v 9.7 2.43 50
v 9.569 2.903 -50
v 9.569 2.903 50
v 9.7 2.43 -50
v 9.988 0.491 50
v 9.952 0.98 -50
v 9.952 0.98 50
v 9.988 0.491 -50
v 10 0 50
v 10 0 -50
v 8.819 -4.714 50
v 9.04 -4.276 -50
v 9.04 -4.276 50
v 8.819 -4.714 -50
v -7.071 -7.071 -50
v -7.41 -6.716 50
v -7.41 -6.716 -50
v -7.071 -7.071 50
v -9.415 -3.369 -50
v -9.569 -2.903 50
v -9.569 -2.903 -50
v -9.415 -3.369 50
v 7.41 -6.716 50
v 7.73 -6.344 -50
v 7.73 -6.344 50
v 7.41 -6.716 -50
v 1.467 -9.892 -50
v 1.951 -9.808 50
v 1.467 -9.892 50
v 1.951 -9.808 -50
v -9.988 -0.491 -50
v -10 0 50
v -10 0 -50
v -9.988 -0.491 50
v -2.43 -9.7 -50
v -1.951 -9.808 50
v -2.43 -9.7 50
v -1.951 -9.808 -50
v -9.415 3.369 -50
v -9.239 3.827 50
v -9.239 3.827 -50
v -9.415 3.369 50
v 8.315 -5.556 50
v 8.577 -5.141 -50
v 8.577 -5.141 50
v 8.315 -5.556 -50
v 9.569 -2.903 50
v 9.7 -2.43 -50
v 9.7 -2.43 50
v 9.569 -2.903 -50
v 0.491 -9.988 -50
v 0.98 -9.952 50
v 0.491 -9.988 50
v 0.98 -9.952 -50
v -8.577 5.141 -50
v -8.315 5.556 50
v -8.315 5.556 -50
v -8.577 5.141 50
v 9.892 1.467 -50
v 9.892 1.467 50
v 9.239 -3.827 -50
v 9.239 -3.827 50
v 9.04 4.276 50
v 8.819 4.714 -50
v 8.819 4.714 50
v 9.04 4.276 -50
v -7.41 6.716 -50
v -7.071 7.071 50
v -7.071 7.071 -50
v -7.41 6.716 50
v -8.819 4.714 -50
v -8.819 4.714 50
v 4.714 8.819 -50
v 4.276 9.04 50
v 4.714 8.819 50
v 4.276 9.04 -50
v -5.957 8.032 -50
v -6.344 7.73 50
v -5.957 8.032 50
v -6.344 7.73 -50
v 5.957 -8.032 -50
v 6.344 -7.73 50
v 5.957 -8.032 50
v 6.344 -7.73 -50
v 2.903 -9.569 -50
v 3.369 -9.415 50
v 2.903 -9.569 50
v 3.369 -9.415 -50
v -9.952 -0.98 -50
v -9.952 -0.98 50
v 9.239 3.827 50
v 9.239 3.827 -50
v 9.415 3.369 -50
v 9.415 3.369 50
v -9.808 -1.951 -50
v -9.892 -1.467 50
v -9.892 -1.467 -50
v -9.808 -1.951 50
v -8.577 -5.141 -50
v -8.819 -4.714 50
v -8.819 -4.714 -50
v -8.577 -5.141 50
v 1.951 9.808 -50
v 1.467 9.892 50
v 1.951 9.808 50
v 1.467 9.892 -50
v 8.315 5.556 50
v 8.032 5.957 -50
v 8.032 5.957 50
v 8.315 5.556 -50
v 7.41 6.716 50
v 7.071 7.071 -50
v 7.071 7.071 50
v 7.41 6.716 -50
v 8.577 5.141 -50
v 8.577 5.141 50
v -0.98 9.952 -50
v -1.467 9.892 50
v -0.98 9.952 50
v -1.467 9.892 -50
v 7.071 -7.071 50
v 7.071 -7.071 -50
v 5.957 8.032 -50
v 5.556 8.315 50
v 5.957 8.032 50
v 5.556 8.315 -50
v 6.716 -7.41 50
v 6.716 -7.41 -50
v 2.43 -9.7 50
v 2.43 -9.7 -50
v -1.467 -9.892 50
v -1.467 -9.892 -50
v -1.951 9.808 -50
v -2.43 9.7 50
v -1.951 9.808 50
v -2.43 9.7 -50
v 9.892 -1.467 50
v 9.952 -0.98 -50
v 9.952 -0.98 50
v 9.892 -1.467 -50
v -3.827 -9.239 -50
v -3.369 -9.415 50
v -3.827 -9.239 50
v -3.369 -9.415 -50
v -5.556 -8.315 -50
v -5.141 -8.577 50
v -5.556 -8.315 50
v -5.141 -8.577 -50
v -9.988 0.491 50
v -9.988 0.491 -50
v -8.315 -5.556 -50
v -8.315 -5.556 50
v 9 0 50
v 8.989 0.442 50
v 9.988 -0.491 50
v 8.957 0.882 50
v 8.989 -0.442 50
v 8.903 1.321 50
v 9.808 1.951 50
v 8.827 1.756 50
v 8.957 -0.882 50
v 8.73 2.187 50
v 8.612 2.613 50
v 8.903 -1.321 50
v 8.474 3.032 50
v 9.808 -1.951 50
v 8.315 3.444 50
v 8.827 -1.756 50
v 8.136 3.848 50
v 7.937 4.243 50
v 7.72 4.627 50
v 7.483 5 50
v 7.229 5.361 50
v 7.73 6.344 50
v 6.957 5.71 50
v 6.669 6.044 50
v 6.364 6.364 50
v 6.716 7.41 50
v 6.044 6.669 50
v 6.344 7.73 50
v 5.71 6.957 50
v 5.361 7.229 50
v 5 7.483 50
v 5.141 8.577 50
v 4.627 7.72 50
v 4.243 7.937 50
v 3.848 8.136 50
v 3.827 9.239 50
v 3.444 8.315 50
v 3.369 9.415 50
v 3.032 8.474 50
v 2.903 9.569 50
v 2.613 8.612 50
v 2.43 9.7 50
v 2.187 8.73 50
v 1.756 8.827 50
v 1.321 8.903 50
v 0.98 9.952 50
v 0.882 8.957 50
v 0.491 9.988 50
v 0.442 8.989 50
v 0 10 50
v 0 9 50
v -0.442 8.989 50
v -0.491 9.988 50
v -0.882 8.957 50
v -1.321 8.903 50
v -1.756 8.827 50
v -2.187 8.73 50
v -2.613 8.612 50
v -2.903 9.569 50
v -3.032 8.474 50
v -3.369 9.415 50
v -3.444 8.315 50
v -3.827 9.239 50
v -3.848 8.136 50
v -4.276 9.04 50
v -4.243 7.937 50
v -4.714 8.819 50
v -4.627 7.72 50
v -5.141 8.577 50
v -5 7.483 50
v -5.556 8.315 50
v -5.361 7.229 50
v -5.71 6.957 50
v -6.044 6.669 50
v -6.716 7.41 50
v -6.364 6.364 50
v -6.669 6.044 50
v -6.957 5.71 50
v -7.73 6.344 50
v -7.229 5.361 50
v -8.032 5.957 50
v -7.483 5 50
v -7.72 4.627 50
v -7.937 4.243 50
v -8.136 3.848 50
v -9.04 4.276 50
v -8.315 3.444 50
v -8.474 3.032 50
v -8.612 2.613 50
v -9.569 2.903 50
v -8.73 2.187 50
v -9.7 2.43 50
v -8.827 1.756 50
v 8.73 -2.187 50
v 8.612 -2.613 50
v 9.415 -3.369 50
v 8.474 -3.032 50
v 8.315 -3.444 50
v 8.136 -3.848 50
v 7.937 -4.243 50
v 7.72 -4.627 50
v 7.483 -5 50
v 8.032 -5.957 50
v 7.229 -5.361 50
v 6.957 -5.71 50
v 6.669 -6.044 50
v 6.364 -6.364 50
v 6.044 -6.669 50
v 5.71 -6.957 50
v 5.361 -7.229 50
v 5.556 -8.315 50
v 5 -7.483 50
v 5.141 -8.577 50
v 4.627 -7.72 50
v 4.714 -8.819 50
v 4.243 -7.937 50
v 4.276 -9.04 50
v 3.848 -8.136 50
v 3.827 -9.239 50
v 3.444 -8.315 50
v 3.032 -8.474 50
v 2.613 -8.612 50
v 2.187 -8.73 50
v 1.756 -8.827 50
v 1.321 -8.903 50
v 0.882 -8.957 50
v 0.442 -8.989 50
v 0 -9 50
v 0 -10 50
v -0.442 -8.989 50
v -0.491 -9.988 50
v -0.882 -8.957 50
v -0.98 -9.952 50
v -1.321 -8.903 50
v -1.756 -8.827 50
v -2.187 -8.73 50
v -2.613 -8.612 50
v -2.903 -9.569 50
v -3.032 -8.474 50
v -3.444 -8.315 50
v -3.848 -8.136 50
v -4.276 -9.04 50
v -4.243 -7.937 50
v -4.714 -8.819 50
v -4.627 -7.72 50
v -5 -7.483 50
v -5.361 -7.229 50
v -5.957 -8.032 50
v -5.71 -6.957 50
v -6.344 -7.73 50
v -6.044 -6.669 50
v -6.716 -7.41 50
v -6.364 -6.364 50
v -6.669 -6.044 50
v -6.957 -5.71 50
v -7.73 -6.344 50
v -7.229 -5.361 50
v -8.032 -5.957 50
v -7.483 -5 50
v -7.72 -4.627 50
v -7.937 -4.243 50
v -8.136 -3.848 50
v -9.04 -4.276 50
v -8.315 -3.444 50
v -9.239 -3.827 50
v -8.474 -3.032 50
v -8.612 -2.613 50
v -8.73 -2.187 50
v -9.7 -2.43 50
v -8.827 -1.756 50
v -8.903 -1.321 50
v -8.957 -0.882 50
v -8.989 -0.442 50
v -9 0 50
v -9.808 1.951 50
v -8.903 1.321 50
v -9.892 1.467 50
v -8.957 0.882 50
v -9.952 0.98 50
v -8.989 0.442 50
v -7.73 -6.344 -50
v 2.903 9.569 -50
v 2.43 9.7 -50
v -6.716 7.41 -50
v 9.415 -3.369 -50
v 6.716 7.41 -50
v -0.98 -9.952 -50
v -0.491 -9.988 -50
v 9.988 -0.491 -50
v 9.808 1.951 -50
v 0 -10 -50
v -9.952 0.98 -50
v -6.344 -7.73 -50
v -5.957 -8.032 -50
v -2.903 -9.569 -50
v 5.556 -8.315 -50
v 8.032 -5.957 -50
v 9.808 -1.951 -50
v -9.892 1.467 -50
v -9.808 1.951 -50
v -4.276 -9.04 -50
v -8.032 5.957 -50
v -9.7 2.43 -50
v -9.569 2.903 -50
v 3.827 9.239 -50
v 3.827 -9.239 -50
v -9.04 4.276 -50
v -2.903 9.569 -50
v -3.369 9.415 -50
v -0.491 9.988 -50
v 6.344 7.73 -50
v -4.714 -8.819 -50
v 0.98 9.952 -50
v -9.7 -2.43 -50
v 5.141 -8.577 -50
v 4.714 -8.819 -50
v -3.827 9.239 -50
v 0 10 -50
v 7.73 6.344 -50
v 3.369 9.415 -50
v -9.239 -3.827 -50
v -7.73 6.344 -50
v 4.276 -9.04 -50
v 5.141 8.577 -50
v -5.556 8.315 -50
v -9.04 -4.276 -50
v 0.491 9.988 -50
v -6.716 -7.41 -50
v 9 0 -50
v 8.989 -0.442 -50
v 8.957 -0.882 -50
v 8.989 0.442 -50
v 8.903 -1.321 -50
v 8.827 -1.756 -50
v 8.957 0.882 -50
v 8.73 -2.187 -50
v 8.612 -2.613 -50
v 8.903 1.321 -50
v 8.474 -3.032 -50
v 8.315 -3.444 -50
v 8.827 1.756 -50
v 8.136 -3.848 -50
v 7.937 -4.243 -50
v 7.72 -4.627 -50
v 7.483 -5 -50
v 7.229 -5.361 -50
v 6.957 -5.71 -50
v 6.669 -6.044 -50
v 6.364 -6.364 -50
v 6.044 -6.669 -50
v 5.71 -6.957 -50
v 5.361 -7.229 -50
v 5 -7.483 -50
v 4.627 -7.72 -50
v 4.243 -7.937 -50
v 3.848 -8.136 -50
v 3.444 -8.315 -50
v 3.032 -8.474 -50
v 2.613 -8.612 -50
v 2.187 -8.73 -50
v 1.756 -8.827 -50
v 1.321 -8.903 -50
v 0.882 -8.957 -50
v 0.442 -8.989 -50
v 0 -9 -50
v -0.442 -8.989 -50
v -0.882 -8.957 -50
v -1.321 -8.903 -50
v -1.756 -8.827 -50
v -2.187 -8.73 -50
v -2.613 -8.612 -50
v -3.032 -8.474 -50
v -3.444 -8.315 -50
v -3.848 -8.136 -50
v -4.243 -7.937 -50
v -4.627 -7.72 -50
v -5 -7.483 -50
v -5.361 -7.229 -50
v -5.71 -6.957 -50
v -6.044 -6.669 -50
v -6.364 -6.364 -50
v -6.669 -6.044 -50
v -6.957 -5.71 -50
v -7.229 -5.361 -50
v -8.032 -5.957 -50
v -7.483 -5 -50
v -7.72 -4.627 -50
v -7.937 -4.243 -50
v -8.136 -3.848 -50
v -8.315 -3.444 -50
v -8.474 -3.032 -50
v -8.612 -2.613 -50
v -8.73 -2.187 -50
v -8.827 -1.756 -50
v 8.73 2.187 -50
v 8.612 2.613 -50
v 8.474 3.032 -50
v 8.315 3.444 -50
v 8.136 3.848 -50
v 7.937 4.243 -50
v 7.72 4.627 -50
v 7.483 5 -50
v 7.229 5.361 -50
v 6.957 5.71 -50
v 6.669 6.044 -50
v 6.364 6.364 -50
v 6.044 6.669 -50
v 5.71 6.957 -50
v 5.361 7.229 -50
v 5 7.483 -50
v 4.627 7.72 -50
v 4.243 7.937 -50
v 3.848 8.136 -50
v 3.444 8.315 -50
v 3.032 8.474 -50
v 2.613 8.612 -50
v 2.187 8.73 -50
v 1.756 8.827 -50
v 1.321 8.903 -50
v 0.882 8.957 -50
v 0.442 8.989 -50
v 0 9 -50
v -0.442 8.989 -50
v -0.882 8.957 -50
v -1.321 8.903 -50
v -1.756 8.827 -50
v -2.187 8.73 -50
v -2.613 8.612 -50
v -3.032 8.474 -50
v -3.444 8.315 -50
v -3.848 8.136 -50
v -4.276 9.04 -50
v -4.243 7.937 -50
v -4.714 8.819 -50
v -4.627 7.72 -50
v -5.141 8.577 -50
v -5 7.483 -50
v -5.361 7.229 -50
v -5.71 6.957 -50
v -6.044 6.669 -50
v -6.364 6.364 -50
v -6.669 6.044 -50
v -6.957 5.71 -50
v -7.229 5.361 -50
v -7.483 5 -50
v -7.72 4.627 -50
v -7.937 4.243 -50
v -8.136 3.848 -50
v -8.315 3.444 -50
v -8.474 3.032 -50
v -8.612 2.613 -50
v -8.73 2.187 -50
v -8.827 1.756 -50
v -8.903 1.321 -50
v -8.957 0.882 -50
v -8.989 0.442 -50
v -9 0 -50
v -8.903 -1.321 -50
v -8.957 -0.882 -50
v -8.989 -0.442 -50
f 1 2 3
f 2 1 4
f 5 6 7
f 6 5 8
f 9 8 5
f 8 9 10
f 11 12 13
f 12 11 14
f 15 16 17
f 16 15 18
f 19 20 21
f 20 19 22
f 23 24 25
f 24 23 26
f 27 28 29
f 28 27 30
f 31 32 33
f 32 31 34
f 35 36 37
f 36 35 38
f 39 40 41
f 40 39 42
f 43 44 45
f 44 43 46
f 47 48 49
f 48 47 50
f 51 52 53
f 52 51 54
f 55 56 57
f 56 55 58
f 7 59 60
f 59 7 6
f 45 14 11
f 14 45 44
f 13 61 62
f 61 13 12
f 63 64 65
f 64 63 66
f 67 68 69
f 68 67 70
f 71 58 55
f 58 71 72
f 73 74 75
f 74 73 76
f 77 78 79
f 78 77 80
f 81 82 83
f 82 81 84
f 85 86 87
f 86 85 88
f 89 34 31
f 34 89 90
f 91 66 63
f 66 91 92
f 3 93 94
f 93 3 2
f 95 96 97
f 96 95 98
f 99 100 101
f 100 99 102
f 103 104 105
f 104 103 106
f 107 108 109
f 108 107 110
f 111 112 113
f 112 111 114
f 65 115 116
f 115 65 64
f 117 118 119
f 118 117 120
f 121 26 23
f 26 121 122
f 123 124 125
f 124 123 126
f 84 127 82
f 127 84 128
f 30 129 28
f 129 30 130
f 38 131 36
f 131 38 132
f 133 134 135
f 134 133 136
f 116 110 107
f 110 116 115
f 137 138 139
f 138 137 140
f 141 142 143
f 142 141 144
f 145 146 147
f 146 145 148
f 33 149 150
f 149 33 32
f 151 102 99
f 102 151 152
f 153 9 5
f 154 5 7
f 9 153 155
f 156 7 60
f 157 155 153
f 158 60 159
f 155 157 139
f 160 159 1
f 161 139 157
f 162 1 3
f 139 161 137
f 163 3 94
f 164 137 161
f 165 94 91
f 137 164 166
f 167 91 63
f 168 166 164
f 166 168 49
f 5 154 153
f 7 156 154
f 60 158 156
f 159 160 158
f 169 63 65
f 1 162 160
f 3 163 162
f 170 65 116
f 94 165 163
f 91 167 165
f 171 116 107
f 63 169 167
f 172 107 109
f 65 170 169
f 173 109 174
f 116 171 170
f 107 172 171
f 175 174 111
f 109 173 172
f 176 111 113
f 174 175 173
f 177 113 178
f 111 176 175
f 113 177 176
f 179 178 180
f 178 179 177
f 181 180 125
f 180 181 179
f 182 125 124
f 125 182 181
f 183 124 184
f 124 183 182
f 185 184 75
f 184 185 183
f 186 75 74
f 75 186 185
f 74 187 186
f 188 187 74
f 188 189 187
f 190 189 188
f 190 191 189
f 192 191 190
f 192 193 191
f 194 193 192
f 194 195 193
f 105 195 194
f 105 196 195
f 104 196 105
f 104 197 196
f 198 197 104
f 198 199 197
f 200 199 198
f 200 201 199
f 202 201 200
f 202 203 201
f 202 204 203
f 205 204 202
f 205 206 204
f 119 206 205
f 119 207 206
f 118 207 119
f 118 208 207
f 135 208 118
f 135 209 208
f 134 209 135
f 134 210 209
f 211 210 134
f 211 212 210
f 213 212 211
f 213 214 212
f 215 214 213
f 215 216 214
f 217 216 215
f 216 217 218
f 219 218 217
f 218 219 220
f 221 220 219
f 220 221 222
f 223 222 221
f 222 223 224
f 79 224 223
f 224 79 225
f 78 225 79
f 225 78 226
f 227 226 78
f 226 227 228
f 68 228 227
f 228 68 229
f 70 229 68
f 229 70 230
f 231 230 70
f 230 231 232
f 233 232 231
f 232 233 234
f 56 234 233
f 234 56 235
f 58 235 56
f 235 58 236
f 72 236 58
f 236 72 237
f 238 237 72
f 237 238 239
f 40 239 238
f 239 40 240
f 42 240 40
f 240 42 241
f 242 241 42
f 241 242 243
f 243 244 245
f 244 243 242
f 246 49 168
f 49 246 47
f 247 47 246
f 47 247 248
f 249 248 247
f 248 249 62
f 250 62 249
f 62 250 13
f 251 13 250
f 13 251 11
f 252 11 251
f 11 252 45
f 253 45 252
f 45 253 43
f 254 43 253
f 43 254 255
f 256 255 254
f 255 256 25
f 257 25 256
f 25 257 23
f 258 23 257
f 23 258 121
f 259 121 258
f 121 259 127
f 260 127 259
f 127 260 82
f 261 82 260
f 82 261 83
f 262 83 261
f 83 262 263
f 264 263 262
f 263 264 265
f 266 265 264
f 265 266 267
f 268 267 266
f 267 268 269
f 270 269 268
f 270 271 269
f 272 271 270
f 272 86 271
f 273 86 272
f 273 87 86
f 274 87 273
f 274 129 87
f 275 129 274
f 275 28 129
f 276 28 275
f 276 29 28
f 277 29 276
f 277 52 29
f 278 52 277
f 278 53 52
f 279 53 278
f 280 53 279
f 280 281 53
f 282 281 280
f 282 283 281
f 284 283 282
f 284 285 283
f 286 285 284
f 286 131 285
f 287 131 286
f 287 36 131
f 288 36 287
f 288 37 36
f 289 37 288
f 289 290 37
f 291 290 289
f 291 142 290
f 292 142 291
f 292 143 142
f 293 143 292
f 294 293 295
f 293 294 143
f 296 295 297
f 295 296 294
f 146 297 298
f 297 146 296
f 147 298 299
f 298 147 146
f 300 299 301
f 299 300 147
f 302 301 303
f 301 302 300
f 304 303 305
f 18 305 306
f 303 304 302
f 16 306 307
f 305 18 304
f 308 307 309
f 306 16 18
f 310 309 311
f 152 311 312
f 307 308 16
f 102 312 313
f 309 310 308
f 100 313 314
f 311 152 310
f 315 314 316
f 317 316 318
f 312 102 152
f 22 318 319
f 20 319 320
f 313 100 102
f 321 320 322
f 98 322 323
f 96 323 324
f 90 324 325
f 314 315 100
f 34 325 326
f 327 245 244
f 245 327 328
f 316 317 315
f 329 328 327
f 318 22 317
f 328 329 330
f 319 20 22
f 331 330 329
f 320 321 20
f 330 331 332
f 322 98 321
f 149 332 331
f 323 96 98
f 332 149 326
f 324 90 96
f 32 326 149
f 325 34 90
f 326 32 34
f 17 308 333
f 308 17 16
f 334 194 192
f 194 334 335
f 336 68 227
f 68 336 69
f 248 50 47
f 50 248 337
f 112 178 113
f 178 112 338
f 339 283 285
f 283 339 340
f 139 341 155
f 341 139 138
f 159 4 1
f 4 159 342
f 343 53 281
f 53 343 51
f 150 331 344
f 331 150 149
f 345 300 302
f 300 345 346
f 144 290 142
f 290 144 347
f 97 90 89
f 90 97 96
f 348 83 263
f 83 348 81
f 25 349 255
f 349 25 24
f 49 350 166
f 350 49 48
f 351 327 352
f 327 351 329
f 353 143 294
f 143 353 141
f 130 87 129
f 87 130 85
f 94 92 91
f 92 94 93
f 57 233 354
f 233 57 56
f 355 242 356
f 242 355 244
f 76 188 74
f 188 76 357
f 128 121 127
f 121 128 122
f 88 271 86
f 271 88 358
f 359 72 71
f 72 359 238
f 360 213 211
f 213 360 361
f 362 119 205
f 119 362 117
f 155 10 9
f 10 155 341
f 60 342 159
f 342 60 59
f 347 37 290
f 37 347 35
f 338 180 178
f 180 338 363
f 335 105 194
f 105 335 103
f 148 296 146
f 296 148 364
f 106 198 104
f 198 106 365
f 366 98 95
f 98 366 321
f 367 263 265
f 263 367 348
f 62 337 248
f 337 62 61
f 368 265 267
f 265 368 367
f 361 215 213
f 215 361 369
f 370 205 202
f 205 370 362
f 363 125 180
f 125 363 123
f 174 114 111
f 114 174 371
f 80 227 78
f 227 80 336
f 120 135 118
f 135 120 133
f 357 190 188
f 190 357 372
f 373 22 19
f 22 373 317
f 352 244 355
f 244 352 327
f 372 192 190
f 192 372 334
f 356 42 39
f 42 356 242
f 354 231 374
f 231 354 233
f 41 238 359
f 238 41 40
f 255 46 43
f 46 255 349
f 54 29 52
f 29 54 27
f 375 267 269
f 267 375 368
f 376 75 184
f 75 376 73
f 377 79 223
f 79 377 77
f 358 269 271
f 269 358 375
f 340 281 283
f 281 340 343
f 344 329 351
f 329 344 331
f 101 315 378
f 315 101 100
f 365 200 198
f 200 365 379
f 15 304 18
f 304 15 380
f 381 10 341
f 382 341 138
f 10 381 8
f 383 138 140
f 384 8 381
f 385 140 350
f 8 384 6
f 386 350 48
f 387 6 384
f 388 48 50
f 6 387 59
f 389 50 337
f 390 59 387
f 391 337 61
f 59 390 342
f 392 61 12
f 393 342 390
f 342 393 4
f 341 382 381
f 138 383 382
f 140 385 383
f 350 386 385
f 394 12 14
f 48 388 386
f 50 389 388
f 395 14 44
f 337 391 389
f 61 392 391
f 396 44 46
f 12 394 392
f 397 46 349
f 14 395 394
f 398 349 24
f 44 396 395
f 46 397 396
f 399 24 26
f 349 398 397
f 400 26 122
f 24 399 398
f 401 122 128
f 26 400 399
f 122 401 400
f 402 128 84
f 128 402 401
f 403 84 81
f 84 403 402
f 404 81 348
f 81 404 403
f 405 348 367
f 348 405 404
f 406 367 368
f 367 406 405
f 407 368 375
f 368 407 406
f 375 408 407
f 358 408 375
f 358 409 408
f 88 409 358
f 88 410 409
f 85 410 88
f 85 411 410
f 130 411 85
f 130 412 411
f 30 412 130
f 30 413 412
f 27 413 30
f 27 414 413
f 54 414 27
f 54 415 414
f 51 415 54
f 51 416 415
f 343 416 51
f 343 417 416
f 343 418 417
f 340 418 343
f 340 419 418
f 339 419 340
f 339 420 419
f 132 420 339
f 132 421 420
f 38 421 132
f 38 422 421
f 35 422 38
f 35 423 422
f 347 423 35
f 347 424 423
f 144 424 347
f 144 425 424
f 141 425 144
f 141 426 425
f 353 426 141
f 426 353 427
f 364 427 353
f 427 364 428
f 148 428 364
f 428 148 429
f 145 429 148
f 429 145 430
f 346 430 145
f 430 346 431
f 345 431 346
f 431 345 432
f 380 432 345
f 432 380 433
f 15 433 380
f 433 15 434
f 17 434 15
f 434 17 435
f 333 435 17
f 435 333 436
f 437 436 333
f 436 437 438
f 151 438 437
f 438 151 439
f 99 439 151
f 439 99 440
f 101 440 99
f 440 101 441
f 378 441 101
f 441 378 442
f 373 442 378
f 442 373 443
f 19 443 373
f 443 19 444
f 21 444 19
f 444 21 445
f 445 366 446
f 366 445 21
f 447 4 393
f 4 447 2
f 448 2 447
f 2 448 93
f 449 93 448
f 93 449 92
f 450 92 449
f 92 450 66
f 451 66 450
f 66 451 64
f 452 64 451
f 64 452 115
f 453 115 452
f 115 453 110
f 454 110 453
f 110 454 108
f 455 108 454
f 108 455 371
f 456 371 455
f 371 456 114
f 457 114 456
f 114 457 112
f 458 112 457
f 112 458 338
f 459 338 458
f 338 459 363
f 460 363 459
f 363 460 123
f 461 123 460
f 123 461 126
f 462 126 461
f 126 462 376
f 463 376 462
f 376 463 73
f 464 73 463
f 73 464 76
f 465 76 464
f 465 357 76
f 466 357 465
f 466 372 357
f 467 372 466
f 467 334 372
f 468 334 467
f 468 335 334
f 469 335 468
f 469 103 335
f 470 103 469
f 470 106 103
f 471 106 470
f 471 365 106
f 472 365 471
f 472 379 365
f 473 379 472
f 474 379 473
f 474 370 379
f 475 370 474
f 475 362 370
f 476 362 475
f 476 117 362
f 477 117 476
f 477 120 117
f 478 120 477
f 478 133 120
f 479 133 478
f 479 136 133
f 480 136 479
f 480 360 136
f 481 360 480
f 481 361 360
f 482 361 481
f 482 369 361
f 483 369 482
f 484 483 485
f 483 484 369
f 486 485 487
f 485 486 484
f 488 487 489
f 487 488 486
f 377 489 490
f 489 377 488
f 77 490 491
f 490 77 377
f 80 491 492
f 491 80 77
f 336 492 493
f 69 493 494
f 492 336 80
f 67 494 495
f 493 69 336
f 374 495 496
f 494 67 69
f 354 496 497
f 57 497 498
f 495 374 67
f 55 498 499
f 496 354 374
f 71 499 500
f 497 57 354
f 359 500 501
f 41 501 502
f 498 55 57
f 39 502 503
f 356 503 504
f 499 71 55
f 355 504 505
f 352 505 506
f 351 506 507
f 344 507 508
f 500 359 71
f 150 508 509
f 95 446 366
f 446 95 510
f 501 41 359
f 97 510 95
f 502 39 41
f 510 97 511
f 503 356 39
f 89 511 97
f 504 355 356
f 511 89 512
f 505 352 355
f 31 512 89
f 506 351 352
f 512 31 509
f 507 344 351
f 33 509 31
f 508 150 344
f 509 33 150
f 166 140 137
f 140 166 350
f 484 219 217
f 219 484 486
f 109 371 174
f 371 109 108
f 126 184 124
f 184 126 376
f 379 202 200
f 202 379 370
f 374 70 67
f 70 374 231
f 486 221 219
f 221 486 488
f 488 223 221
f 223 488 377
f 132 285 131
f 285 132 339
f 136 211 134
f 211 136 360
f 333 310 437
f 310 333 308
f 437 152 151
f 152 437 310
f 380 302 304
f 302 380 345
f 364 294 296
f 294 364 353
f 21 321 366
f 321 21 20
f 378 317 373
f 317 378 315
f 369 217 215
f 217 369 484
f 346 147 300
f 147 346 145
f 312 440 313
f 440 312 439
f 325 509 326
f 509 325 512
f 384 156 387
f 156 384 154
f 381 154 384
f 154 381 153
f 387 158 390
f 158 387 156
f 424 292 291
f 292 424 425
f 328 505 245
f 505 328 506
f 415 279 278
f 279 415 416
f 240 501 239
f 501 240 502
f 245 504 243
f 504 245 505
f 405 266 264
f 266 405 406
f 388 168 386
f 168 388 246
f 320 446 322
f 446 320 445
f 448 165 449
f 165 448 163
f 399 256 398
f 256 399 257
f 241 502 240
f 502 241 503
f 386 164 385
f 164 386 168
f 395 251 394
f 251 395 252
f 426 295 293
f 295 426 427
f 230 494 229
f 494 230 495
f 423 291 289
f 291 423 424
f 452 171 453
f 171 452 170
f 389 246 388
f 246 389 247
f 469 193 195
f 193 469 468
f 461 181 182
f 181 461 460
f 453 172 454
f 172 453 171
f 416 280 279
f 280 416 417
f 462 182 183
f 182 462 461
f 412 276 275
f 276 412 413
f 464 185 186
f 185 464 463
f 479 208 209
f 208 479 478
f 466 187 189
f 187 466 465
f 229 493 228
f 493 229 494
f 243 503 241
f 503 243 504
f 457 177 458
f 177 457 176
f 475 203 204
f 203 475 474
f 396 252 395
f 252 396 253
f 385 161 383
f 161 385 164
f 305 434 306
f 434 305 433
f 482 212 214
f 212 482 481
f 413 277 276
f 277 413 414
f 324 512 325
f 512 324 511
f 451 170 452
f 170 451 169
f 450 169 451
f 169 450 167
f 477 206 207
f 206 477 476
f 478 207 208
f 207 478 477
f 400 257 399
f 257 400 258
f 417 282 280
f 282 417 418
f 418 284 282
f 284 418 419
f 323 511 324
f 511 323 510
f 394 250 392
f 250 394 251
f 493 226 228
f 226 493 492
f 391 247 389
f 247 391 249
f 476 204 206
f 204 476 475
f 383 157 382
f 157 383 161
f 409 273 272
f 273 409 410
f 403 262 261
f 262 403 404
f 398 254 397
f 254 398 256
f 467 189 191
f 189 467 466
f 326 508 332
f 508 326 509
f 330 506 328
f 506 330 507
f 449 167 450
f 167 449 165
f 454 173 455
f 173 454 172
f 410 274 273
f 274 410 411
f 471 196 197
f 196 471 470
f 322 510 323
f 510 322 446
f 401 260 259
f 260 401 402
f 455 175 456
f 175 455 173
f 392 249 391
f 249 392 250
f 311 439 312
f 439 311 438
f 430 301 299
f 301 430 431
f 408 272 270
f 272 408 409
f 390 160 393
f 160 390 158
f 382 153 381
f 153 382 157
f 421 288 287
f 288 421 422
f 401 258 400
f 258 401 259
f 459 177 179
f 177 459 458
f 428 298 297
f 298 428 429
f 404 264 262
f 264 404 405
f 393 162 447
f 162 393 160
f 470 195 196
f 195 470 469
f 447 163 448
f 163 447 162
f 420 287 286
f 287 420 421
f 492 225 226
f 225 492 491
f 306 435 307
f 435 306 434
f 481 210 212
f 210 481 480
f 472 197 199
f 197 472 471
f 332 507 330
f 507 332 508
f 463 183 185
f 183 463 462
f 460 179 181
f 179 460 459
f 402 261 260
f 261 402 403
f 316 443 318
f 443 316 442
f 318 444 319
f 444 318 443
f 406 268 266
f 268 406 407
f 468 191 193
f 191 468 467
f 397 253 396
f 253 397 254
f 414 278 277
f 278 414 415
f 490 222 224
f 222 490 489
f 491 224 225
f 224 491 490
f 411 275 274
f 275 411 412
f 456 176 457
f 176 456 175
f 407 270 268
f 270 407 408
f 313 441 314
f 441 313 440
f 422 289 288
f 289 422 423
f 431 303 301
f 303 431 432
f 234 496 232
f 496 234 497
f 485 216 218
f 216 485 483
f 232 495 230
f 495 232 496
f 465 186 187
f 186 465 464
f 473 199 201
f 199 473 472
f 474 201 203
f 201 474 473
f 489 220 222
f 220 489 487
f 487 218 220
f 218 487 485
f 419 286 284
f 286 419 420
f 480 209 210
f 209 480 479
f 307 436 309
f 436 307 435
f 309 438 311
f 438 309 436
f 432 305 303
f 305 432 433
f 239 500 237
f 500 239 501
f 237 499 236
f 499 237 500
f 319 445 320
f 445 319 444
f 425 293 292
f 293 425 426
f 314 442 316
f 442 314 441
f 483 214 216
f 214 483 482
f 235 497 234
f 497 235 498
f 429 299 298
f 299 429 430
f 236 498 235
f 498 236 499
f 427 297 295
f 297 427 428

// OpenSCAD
$fn = 128;

// Parameters for the tubing (carbon fiber)
outer_diameter = 20;   // mm
inner_diameter = 18;   // mm
length         = 100;  // mm
centered       = true; // center on origin

// Carbon fiber appearance (simple dark gray)
module material_appearance_carbon_fiber() {
    color([0.08, 0.08, 0.09, 1]) children();
}

// Hollow tube (robust subtraction; avoids coplanar artifacts that can look "blank")
module hollow_bore(outer_d, inner_d, len, centered=true) {
    eps = 0.2; // small overlap to guarantee clean subtraction

    difference() {
        cylinder(d=outer_d, h=len, center=centered);

        // Shift inner cutter along Z so its faces are not coplanar with the outer tube faces
        translate([0, 0, centered ? 0 : eps])
            cylinder(d=inner_d, h=len + 2*eps, center=centered);
    }
}

// Main tubing segment
module tubing_segment() {
    material_appearance_carbon_fiber()
        hollow_bore(outer_diameter, inner_diameter, length, centered);
}

tubing_segment();
